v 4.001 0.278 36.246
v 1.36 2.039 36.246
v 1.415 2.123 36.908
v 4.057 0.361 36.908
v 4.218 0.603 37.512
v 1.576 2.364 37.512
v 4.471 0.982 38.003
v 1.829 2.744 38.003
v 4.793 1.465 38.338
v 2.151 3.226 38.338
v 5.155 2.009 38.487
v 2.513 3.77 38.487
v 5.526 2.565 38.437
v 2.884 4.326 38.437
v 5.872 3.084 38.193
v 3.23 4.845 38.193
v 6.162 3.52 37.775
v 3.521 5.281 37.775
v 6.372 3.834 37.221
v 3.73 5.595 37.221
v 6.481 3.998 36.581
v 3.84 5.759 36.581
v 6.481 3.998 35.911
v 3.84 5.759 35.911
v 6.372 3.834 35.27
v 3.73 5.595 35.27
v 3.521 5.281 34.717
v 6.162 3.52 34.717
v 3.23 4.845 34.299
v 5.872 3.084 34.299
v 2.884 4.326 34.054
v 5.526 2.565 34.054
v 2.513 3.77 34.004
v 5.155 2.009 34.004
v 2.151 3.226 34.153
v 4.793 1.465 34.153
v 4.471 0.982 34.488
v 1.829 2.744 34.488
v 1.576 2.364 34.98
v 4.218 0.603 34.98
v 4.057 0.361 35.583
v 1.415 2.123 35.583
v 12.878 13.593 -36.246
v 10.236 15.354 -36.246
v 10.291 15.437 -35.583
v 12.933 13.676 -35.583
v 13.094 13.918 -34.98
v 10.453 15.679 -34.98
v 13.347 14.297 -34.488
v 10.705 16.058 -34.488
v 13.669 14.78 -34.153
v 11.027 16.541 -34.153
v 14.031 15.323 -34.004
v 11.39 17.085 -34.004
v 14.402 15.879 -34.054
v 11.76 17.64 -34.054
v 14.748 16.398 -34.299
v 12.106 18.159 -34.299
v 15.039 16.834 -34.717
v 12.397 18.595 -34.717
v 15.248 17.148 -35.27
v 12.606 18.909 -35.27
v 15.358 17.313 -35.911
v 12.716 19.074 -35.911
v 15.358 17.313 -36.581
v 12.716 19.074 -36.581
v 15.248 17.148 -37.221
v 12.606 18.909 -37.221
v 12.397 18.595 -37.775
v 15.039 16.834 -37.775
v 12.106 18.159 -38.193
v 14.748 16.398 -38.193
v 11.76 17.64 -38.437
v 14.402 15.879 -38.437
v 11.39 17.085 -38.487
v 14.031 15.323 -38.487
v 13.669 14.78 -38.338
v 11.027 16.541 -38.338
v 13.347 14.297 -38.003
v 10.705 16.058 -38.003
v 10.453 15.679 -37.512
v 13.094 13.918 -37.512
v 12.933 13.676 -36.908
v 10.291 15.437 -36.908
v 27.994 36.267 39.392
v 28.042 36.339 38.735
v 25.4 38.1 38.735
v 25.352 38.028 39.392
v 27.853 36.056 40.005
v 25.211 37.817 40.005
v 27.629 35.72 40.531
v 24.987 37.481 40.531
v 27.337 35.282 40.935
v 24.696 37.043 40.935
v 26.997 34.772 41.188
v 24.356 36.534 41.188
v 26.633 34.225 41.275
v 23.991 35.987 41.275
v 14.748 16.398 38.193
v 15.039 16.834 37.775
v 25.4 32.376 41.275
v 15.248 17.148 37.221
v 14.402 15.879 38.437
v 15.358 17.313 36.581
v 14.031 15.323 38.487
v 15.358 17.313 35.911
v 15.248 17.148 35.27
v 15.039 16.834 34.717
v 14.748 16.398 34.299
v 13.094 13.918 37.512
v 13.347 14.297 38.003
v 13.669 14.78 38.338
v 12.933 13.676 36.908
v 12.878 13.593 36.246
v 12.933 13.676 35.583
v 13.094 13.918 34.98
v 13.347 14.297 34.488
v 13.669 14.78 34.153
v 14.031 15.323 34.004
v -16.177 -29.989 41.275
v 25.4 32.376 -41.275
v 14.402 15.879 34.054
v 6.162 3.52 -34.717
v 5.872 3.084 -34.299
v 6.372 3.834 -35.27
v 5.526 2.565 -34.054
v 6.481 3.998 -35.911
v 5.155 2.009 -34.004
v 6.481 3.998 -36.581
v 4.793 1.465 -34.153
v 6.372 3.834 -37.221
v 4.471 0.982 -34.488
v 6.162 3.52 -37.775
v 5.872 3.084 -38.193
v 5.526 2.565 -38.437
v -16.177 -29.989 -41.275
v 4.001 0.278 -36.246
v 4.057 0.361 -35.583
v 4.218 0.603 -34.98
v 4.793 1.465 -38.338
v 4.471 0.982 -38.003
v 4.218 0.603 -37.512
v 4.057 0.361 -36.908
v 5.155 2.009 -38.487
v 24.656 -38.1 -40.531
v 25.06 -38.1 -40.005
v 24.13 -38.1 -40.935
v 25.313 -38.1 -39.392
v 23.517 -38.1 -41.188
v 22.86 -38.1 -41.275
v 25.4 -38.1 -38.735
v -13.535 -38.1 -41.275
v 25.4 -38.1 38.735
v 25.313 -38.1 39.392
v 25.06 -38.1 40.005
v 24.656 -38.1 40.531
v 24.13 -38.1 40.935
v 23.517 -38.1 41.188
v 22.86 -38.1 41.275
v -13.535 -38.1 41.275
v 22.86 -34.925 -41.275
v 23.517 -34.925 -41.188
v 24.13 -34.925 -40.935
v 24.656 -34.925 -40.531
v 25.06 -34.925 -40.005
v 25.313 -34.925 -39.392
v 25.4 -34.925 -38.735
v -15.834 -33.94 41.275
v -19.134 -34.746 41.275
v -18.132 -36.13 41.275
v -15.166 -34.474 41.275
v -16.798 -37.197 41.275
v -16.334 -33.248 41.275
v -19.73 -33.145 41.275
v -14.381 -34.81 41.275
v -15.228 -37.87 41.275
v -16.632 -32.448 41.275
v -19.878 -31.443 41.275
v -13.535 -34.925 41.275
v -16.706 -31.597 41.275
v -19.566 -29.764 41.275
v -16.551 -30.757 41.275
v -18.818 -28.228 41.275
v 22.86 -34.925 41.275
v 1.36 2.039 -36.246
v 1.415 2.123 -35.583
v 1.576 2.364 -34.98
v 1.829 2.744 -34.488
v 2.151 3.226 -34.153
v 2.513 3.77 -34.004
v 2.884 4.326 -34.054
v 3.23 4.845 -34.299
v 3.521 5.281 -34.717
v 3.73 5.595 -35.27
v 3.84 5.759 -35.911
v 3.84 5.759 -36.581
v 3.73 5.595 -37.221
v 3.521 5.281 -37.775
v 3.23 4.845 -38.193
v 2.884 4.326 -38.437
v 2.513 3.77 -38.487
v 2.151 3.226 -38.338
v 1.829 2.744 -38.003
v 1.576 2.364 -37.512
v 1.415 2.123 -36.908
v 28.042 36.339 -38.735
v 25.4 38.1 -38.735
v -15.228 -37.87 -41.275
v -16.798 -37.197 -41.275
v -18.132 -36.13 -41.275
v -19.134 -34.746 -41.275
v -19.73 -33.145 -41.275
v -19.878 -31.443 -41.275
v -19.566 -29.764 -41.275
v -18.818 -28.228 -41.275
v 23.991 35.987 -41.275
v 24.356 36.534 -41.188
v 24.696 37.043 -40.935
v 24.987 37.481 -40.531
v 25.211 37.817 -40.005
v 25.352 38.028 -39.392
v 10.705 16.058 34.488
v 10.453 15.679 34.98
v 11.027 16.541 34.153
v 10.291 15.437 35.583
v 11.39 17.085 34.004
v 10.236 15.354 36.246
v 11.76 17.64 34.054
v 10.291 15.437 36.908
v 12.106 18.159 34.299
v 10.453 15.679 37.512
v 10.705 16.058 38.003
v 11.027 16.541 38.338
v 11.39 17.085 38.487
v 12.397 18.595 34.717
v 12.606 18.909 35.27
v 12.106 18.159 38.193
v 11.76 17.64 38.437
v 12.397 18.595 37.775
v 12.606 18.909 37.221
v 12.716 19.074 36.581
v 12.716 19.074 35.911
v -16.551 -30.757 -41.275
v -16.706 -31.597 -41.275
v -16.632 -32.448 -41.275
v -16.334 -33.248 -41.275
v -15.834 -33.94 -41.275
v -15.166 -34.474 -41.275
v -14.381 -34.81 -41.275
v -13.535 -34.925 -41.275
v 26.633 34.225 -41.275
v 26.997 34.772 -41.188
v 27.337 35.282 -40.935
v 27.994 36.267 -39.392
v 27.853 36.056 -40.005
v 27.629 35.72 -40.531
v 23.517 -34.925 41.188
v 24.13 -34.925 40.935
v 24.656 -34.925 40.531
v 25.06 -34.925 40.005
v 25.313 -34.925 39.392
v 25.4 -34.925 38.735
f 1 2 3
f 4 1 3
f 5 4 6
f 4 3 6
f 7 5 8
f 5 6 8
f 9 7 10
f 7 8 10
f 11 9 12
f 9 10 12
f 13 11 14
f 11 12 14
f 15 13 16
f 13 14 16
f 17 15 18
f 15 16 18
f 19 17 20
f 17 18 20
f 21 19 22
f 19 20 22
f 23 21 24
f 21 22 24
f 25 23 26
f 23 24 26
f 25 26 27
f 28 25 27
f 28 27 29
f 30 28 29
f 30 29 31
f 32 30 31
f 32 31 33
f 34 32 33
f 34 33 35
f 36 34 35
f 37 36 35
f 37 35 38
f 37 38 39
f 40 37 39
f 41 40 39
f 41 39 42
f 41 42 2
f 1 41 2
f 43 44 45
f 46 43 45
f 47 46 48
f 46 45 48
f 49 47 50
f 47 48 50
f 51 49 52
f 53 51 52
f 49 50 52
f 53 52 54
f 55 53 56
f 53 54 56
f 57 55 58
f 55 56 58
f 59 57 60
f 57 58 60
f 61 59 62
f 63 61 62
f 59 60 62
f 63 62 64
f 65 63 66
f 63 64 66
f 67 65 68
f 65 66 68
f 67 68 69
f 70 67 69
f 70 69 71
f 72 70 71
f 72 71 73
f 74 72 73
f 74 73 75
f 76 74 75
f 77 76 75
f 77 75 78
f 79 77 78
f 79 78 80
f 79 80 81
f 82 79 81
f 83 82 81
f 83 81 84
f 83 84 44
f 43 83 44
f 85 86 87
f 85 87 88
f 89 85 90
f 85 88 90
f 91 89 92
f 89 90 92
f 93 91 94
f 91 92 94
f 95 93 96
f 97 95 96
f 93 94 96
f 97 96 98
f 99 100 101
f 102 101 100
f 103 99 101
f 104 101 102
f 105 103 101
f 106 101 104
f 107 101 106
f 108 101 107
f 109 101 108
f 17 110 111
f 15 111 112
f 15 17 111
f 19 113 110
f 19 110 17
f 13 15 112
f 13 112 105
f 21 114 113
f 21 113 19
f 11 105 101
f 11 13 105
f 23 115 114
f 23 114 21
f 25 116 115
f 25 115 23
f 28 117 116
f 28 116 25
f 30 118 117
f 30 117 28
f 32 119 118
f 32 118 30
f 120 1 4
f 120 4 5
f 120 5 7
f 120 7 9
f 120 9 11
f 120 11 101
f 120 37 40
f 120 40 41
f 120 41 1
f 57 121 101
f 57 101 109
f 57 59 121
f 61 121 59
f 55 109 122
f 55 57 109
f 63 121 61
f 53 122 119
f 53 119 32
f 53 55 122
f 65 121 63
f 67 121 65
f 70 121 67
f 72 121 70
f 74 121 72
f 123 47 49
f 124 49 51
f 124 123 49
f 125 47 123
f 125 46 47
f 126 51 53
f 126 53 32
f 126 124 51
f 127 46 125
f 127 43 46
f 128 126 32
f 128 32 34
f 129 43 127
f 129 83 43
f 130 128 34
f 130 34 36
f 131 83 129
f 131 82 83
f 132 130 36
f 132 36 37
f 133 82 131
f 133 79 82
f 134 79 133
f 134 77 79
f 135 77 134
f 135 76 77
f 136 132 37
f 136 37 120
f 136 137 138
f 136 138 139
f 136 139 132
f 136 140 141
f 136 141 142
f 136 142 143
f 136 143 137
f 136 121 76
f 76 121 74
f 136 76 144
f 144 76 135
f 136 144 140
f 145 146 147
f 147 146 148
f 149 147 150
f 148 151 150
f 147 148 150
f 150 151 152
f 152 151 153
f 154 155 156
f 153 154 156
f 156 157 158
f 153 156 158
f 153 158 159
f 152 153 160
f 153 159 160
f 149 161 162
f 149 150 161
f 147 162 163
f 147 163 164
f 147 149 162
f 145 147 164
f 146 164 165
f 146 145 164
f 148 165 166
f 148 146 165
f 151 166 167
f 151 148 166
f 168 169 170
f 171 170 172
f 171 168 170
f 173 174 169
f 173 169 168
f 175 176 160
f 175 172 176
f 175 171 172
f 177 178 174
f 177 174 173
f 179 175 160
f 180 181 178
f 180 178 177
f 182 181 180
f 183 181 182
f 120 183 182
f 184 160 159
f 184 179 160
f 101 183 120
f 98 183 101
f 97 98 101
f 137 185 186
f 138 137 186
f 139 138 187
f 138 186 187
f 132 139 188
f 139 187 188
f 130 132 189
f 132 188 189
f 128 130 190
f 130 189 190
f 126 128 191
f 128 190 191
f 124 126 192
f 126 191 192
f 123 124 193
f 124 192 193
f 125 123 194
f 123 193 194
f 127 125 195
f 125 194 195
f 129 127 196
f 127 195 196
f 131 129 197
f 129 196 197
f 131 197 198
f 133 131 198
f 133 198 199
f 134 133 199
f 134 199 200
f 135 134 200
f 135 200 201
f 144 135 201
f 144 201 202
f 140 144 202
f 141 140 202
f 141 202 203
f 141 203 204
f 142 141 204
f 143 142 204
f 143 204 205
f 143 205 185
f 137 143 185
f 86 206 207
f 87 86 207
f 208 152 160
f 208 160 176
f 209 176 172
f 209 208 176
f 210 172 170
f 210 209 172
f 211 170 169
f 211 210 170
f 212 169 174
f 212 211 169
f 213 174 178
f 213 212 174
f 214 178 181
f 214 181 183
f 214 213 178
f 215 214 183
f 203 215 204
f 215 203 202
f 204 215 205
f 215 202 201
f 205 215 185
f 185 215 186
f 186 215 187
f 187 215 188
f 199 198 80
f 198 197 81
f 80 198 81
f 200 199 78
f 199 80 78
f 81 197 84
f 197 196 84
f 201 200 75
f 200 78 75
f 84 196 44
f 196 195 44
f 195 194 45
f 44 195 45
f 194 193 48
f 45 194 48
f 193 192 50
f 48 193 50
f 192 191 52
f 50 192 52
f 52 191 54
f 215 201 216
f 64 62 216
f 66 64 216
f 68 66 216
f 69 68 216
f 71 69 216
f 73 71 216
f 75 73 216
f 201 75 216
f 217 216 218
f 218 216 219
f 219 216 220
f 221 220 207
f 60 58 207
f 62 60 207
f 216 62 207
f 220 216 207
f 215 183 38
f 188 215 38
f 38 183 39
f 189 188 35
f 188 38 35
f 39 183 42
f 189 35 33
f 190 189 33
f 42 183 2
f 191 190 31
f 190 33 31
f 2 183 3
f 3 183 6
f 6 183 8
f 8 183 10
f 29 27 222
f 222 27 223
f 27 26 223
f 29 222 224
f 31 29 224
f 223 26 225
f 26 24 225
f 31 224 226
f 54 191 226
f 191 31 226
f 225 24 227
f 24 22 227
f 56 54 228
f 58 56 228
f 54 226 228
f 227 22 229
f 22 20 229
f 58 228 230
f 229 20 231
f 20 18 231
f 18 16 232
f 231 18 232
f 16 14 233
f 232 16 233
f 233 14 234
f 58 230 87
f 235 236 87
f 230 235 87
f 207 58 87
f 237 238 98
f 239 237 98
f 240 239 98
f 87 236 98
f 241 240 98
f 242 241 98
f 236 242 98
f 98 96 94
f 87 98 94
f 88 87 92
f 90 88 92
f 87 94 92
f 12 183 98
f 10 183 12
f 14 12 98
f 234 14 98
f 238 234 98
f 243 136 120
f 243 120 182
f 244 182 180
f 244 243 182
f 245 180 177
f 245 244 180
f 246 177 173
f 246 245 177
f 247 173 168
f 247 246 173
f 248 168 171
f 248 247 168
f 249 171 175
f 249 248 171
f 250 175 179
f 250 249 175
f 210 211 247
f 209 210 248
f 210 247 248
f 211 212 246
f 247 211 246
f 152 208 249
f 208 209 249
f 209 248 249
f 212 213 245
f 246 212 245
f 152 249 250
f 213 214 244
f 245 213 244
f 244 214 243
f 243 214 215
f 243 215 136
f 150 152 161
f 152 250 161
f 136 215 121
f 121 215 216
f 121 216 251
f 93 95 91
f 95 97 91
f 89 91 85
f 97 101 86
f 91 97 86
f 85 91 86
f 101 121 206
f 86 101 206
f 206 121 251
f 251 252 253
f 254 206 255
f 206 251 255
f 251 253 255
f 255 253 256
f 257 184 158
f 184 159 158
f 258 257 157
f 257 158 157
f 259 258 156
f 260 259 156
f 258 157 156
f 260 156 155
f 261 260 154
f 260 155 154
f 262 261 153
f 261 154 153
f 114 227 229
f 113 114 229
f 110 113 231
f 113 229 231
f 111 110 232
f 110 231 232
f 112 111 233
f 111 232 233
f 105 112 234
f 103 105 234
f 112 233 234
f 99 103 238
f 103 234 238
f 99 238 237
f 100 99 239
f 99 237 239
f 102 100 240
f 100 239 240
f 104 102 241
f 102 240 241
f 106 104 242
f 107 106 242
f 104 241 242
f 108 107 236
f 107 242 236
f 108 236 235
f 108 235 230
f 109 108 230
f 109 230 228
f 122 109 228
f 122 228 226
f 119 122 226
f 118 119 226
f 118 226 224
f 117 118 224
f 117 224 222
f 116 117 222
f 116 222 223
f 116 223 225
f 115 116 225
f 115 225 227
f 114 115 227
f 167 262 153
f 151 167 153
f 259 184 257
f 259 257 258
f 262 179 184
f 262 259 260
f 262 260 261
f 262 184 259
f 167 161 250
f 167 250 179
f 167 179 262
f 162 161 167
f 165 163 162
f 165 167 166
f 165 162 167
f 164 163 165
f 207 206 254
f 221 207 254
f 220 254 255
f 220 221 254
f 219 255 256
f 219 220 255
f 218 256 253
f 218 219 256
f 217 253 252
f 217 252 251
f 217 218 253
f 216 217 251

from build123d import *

# Parameters (mm, degrees)
BOSS_EXTRUDE1_DEPTH    = 41.275
CONVERT_SOLID1_START   = -41.275
CONVERT_SOLID1_DEPTH   = 82.55
CONVERT_SOLID1_2_DEPTH = 82.55
CUT_EXTRUDE1_REACH     = 64.782
SKETCH6_R              = 2.2479
FILLET1_R              = 2.54


# Read off the part's stored shape, not the designer's step: Convert-Solid1
with BuildPart() as part:
    # Sketch1 → Boss-Extrude1 (new, symmetric)
    with BuildSketch(Plane.XY):
        Polygon((25.4, -38.1), (-25.4, -38.1), (25.4, 38.1), align=None)
    extrude(amount=BOSS_EXTRUDE1_DEPTH, both=True)

    # Convert-Solid1 outline → Convert-Solid1 (cut)
    with BuildSketch(Plane.XY.offset(CONVERT_SOLID1_START)):
        with BuildLine():
            Line((25.4, -34.925), (25.4, 32.37618735))
            Line((25.4, 32.37618735), (-16.176676151, -29.988826877))
            ThreePointArc((-16.176676151, -29.988826877), (-16.334233318, -33.248148914), (-13.534916467, -34.925))
            Line((-13.534916467, -34.925), (25.4, -34.925))
        make_face()
        with BuildLine():
            ThreePointArc((-13.534916467, -38.1), (-19.133550169, -34.746297827), (-18.818435836, -28.227653754))
            Line((-18.818435836, -28.227653754), (-25.4, -38.1))
            Line((-25.4, -38.1), (-13.534916467, -38.1))
        make_face()
    extrude(amount=CONVERT_SOLID1_DEPTH, mode=Mode.SUBTRACT)

    # Convert-Solid1 2 outline → Convert-Solid1 2 (add)
    with BuildSketch(Plane.XY.offset(CONVERT_SOLID1_START)):
        Polygon((28.041759685, 36.338826877), (25.4, 38.1), (25.4, 32.37618735), align=None)
    extrude(amount=CONVERT_SOLID1_2_DEPTH)

    # Sketch6 → Cut-Extrude1 (cut, up to next)
    with BuildSketch(Plane(origin=(0, 0, 0), x_dir=(0, 0, 1), z_dir=(-0.8320502943378438, 0.554700196225229, 0)), mode=Mode.PRIVATE) as cut_extrude1_sk1:
        with Locations(Location((-36.2458, 20.701, 0), (0, 0, 270))):
            Circle(SKETCH6_R)
    cut_extrude1_tool1 = extrude(cut_extrude1_sk1.sketch, amount=-CUT_EXTRUDE1_REACH, mode=Mode.PRIVATE) & part.part
    # Sketch6 → Cut-Extrude1 (cut, up to next)
    with BuildSketch(Plane(origin=(0, 0, 0), x_dir=(0, 0, 1), z_dir=(-0.8320502943378438, 0.554700196225229, 0)), mode=Mode.PRIVATE) as cut_extrude1_sk2:
        with Locations(Location((36.2458, 20.701, 0), (0, 0, 270))):
            Circle(SKETCH6_R)
    cut_extrude1_tool2 = extrude(cut_extrude1_sk2.sketch, amount=-CUT_EXTRUDE1_REACH, mode=Mode.PRIVATE) & part.part
    # Sketch6 → Cut-Extrude1 (cut, up to next)
    with BuildSketch(Plane(origin=(0, 0, 0), x_dir=(0, 0, 1), z_dir=(-0.8320502943378438, 0.554700196225229, 0)), mode=Mode.PRIVATE) as cut_extrude1_sk3:
        with Locations(Location((-36.2458, 4.699, 0), (0, 0, 270))):
            Circle(SKETCH6_R)
    cut_extrude1_tool3 = extrude(cut_extrude1_sk3.sketch, amount=-CUT_EXTRUDE1_REACH, mode=Mode.PRIVATE) & part.part
    # Sketch6 → Cut-Extrude1 (cut, up to next)
    with BuildSketch(Plane(origin=(0, 0, 0), x_dir=(0, 0, 1), z_dir=(-0.8320502943378438, 0.554700196225229, 0)), mode=Mode.PRIVATE) as cut_extrude1_sk4:
        with Locations(Location((36.2458, 4.699, 0), (0, 0, 270))):
            Circle(SKETCH6_R)
    cut_extrude1_tool4 = extrude(cut_extrude1_sk4.sketch, amount=-CUT_EXTRUDE1_REACH, mode=Mode.PRIVATE) & part.part
    add(cut_extrude1_tool1.solids().sort_by_distance((11.482849, 17.224273, -36.2458))[0], mode=Mode.SUBTRACT)
    add(cut_extrude1_tool2.solids().sort_by_distance((11.482849, 17.224273, 36.2458))[0], mode=Mode.SUBTRACT)
    add(cut_extrude1_tool3.solids().sort_by_distance((2.606536, 3.909804, -36.2458))[0], mode=Mode.SUBTRACT)
    add(cut_extrude1_tool4.solids().sort_by_distance((2.606536, 3.909804, 36.2458))[0], mode=Mode.SUBTRACT)

    # Fillet1
    fillet1_edges = [part.edges().sort_by_distance(p)[0] for p in [
        (26.720879842, 37.219413438, -41.275),
        (26.720879842, 37.219413438, 41.275),
        (25.4, -36.5125, 41.275),
        (25.4, -36.5125, -41.275),
    ]]
    fillet(fillet1_edges, radius=FILLET1_R)


solid = part.part
